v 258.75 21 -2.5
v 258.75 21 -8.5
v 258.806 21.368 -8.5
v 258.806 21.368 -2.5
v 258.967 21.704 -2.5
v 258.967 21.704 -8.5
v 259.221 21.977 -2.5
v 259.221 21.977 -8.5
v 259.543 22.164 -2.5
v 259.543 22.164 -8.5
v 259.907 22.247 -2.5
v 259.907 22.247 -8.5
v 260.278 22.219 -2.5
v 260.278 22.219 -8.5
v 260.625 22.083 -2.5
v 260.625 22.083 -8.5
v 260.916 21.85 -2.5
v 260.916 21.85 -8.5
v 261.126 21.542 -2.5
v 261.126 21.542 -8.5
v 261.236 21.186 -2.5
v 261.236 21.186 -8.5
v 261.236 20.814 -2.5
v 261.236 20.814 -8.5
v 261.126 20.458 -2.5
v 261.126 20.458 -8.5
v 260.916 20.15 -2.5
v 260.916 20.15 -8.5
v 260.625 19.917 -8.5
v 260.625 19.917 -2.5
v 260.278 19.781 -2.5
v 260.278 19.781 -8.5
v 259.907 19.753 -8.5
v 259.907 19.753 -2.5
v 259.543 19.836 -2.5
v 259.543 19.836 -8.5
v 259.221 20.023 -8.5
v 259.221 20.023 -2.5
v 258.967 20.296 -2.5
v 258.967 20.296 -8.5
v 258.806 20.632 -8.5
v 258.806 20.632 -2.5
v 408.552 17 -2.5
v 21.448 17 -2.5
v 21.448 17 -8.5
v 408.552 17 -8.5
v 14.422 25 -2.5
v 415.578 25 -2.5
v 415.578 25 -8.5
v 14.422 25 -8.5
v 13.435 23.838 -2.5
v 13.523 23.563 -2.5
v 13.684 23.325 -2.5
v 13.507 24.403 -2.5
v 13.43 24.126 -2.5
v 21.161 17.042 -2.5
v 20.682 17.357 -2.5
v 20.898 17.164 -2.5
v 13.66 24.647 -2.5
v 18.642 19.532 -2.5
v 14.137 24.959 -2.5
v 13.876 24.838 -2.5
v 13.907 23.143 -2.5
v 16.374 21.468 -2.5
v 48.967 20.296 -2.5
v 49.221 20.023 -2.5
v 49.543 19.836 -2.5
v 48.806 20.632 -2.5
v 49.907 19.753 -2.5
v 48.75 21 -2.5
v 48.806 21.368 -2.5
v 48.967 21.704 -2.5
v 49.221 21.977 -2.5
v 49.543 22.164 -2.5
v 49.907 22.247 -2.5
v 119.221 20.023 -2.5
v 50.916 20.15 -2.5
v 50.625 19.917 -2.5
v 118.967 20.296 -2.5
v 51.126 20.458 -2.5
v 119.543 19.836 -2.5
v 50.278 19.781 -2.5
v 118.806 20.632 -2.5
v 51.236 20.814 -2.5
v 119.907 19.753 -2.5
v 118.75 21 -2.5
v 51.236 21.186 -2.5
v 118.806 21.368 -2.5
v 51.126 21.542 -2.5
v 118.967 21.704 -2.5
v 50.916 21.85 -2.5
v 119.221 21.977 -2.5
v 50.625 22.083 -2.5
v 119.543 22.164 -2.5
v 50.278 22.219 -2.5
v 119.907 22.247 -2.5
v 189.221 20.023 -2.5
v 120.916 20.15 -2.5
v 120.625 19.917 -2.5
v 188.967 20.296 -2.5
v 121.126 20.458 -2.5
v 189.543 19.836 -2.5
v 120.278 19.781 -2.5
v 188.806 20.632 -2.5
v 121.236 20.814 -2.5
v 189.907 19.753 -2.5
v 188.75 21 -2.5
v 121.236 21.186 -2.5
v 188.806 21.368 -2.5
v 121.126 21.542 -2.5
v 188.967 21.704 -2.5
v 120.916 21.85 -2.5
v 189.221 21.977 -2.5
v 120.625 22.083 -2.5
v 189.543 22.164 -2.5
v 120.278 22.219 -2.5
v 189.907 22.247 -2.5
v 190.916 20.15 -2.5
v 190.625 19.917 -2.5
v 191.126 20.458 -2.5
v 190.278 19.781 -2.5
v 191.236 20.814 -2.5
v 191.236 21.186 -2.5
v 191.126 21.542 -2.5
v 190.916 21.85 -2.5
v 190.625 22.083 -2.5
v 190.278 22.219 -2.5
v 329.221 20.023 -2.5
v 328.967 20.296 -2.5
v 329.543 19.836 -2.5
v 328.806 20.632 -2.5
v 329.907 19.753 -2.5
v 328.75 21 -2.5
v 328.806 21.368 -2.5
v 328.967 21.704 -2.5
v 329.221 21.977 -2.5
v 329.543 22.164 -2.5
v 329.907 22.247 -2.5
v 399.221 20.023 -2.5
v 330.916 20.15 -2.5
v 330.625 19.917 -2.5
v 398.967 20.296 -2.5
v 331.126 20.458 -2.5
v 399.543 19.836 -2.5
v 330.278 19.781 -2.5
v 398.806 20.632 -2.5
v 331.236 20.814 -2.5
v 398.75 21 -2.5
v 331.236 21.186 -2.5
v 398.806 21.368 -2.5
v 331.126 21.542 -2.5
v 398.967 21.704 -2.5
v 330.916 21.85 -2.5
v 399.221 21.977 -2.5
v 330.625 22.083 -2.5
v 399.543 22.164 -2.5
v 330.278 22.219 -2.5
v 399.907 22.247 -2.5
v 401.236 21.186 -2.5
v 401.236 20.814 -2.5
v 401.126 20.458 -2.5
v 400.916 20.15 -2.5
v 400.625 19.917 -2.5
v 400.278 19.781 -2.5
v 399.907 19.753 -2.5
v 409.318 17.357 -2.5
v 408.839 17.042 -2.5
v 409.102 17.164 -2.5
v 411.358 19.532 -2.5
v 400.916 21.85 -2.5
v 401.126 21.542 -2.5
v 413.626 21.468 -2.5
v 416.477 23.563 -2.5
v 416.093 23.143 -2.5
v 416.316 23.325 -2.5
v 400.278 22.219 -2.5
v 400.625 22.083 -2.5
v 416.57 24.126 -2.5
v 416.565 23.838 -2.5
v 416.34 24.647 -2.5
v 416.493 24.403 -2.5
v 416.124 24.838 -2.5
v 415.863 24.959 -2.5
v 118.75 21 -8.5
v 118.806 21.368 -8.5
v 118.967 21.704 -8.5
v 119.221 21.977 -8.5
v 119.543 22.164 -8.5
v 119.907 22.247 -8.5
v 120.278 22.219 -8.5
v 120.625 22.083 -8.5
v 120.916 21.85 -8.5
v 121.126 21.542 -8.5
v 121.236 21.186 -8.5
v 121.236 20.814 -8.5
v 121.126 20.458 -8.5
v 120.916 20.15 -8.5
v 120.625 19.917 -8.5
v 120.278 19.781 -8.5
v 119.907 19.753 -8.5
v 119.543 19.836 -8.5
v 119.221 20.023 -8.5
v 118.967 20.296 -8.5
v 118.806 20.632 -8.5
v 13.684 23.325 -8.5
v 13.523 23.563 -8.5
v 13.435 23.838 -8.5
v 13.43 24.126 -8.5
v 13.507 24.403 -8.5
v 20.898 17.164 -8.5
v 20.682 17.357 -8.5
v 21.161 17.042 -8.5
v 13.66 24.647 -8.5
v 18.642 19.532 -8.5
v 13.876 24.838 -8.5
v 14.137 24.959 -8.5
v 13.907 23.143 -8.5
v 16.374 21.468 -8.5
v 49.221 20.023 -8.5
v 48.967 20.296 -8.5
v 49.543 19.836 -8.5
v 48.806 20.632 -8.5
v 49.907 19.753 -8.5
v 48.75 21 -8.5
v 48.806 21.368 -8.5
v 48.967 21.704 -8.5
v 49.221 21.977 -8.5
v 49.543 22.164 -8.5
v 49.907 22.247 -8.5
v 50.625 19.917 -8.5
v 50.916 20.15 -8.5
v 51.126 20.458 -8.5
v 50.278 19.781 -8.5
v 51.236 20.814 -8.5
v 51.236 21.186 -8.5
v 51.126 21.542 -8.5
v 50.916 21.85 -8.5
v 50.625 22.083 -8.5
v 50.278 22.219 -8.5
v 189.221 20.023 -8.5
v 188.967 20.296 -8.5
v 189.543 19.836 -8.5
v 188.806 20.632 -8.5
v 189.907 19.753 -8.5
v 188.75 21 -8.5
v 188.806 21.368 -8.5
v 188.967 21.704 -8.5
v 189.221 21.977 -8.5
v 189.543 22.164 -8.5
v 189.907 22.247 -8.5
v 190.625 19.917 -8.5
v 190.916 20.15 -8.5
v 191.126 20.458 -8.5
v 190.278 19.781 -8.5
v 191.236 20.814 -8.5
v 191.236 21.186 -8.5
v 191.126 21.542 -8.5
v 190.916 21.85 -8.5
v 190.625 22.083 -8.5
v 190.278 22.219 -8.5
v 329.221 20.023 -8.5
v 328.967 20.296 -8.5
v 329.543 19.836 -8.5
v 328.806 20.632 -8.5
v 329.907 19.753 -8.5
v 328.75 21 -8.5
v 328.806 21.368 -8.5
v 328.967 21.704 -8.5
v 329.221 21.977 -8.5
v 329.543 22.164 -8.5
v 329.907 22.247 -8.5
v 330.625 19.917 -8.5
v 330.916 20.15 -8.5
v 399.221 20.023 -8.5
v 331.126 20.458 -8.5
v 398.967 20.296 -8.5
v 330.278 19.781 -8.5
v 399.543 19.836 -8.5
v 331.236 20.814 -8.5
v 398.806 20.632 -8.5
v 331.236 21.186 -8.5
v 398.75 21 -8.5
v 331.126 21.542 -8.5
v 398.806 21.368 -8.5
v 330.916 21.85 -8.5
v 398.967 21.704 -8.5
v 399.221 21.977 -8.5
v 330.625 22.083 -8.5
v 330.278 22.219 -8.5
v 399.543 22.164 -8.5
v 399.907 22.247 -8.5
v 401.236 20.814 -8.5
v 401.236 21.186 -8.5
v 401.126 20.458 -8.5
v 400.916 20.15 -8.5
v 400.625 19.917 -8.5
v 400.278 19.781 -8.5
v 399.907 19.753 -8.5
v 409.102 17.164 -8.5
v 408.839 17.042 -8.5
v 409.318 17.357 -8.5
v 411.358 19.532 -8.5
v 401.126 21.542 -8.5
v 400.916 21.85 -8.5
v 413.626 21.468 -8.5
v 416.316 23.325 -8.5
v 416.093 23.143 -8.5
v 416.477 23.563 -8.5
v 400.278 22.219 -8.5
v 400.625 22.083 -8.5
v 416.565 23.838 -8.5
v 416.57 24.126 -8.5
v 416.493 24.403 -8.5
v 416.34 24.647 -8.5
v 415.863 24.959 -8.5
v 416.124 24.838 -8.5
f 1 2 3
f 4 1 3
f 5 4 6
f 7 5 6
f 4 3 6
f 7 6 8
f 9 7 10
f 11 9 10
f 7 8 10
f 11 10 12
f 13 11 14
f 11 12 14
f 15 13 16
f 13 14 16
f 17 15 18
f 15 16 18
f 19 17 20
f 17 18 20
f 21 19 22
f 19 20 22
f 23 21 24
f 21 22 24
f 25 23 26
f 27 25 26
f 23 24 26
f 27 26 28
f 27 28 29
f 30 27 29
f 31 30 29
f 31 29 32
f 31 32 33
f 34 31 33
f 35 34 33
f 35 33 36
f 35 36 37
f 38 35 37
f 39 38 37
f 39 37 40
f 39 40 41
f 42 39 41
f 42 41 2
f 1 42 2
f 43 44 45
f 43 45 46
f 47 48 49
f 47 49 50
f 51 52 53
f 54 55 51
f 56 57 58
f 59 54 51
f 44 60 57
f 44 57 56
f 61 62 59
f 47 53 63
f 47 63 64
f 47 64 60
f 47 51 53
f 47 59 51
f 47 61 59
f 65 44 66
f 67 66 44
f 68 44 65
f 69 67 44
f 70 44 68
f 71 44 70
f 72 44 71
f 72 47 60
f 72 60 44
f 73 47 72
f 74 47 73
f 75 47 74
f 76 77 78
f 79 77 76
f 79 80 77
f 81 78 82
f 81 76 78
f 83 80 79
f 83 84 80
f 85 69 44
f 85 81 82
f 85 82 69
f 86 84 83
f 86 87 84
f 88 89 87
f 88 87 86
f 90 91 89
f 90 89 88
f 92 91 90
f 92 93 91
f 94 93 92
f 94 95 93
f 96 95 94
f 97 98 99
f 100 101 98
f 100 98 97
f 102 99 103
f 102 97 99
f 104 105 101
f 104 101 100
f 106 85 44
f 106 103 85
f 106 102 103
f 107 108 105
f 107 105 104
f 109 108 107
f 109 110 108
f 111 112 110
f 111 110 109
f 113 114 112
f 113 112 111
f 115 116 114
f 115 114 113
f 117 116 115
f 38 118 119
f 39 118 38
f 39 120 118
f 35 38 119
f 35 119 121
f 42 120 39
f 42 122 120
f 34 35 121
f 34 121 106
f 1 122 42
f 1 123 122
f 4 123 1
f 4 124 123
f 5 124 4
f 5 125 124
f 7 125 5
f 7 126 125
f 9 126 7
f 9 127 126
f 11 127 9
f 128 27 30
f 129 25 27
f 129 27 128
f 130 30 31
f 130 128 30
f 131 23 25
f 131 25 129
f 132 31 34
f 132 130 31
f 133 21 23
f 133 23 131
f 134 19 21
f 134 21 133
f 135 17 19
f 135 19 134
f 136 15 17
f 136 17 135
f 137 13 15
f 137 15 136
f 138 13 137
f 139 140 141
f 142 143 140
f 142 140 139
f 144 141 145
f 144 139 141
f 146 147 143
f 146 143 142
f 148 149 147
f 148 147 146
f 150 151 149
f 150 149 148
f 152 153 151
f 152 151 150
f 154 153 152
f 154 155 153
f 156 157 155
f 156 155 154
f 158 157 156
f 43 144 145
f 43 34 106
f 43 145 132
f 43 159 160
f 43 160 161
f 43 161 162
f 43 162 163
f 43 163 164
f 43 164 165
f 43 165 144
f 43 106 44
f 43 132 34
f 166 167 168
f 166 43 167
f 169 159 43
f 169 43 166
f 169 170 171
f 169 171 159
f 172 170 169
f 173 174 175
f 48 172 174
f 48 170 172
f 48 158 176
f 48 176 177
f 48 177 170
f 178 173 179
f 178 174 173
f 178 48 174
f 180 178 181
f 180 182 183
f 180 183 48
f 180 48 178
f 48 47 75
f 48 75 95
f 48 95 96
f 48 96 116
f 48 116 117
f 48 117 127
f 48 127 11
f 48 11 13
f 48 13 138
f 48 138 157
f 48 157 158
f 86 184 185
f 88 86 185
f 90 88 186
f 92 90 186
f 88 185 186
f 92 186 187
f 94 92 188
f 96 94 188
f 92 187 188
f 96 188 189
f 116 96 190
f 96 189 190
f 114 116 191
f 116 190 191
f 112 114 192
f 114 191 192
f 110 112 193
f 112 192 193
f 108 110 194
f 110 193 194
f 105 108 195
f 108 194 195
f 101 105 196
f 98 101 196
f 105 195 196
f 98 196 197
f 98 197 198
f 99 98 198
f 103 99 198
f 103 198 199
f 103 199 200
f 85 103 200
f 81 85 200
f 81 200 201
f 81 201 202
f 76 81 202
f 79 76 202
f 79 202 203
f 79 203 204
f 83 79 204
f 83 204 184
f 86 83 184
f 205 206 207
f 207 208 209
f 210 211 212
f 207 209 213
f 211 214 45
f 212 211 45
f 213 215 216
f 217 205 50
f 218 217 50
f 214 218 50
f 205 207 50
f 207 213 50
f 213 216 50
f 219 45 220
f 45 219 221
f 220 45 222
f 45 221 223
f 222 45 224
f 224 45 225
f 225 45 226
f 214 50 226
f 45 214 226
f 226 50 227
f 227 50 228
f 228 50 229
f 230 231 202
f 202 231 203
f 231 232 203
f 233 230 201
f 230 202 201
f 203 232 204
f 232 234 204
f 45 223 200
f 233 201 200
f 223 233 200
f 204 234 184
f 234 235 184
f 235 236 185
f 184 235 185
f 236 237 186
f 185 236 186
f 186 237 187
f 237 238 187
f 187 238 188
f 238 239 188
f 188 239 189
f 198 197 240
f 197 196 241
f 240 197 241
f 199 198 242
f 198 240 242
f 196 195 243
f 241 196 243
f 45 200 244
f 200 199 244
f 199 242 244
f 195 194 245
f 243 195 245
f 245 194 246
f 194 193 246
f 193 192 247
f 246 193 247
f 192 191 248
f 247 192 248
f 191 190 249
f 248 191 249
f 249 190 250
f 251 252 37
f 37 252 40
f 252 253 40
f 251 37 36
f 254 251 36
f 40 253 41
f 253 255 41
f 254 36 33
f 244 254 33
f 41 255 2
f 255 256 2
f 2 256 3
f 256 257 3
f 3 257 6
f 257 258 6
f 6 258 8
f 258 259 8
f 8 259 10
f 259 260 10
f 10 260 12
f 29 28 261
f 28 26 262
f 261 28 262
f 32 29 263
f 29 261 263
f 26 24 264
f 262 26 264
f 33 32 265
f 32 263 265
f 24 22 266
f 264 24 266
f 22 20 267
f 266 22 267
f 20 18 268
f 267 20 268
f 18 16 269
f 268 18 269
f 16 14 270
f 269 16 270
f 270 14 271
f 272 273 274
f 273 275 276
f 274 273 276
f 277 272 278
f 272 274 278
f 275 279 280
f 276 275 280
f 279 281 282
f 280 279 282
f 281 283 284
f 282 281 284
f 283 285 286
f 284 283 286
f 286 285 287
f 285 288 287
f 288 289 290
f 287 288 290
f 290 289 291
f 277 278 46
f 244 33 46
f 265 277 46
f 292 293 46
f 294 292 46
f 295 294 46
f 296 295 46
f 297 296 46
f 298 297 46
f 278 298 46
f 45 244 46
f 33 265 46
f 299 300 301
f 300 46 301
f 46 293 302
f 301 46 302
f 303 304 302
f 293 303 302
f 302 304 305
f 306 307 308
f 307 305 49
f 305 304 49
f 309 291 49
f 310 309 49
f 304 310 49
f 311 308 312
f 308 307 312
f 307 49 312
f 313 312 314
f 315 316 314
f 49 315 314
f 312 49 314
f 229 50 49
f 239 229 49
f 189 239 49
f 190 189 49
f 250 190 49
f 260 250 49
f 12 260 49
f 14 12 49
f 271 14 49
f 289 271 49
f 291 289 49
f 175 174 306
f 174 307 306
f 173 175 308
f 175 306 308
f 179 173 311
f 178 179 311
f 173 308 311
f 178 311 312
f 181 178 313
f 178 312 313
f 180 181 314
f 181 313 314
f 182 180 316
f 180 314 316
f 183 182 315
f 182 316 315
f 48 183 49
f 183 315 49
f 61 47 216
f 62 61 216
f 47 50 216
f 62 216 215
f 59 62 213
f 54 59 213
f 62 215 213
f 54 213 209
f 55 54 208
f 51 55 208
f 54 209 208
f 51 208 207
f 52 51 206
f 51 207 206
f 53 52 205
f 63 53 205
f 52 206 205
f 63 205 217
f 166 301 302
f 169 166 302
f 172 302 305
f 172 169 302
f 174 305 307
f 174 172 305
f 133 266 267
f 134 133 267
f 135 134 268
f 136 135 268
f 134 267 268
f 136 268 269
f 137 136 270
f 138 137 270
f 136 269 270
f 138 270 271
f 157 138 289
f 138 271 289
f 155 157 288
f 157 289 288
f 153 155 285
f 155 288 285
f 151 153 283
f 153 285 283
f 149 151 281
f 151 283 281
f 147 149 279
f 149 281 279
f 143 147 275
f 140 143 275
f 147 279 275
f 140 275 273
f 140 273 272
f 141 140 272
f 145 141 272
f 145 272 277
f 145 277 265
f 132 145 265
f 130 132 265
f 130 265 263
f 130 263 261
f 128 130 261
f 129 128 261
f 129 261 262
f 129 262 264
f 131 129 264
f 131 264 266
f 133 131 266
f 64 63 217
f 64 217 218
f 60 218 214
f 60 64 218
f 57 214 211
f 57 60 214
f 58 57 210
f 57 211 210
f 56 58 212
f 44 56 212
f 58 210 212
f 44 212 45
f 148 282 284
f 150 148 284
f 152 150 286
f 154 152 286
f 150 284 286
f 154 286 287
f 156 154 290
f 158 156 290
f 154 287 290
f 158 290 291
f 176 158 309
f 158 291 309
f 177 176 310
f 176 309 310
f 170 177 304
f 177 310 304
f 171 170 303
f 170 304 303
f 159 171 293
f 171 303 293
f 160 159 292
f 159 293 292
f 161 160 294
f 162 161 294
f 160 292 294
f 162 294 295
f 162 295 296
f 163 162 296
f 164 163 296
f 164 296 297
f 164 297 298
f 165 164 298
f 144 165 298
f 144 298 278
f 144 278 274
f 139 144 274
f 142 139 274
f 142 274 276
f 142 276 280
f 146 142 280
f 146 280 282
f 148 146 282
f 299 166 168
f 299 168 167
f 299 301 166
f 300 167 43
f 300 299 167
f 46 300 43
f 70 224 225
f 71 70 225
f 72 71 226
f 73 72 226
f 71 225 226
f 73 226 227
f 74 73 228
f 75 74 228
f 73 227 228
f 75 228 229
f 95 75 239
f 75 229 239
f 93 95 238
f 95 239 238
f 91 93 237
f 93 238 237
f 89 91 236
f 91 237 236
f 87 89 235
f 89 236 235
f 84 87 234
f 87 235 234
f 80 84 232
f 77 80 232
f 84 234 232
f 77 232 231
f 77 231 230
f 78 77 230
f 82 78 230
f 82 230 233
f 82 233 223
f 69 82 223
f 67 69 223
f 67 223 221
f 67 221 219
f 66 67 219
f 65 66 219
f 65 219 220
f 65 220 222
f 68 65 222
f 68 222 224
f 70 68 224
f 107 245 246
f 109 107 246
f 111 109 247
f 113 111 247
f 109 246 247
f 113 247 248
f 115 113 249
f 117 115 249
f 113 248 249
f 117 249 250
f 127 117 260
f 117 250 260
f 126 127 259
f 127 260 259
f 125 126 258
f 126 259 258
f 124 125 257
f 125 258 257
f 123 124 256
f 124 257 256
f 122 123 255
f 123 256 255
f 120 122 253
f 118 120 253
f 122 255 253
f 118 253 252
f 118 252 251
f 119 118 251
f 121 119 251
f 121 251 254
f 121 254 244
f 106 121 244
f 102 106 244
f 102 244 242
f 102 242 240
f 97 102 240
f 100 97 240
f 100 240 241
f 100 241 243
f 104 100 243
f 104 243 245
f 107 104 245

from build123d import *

# Parameters (mm, degrees)
AUFSATZ_LINEAR_START             = -2.5
AUFSATZ_LINEAR_AUSTRAGEN1_DEPTH  = 6
VERRUNDUNG1_R                    = 1
F_2_5_2_5_DURCHMESSER_BOHRUNG1_D = 2.5


with BuildPart() as part:
    # Skizze1 → Aufsatz-Linear austragen1 (new body)
    with BuildSketch(Plane.XY.offset(AUFSATZ_LINEAR_START)):
        with BuildLine():
            Line((225, 17), (409.023823037, 17))
            ThreePointArc((409.023823037, 17), (413.907829989, 21.680453509), (419.801960973, 25))
            Line((419.801960973, 25), (10.198039027, 25))
            ThreePointArc((10.198039027, 25), (16.092170011, 21.680453509), (20.976176963, 17))
            Line((20.976176963, 17), (225, 17))
        make_face()
    extrude(amount=-AUFSATZ_LINEAR_AUSTRAGEN1_DEPTH)

    # Verrundung1
    verrundung1_edges = [part.edges().sort_by_distance(p)[0] for p in [
        (409.023823037, 17, -5.5),
        (20.976176963, 17, -5.5),
        (10.198039027, 25, -5.5),
        (419.801960973, 25, -5.5),
    ]]
    fillet(verrundung1_edges, radius=VERRUNDUNG1_R)

    # Ø2.5 (2.5) Durchmesser Bohrung1 (through all)
    with Locations(Plane.XY.offset(-2.5)):
        with Locations((400, 21), (330, 21), (260, 21), (190, 21), (120, 21), (50, 21)):
            Hole(F_2_5_2_5_DURCHMESSER_BOHRUNG1_D / 2)


solid = part.part
